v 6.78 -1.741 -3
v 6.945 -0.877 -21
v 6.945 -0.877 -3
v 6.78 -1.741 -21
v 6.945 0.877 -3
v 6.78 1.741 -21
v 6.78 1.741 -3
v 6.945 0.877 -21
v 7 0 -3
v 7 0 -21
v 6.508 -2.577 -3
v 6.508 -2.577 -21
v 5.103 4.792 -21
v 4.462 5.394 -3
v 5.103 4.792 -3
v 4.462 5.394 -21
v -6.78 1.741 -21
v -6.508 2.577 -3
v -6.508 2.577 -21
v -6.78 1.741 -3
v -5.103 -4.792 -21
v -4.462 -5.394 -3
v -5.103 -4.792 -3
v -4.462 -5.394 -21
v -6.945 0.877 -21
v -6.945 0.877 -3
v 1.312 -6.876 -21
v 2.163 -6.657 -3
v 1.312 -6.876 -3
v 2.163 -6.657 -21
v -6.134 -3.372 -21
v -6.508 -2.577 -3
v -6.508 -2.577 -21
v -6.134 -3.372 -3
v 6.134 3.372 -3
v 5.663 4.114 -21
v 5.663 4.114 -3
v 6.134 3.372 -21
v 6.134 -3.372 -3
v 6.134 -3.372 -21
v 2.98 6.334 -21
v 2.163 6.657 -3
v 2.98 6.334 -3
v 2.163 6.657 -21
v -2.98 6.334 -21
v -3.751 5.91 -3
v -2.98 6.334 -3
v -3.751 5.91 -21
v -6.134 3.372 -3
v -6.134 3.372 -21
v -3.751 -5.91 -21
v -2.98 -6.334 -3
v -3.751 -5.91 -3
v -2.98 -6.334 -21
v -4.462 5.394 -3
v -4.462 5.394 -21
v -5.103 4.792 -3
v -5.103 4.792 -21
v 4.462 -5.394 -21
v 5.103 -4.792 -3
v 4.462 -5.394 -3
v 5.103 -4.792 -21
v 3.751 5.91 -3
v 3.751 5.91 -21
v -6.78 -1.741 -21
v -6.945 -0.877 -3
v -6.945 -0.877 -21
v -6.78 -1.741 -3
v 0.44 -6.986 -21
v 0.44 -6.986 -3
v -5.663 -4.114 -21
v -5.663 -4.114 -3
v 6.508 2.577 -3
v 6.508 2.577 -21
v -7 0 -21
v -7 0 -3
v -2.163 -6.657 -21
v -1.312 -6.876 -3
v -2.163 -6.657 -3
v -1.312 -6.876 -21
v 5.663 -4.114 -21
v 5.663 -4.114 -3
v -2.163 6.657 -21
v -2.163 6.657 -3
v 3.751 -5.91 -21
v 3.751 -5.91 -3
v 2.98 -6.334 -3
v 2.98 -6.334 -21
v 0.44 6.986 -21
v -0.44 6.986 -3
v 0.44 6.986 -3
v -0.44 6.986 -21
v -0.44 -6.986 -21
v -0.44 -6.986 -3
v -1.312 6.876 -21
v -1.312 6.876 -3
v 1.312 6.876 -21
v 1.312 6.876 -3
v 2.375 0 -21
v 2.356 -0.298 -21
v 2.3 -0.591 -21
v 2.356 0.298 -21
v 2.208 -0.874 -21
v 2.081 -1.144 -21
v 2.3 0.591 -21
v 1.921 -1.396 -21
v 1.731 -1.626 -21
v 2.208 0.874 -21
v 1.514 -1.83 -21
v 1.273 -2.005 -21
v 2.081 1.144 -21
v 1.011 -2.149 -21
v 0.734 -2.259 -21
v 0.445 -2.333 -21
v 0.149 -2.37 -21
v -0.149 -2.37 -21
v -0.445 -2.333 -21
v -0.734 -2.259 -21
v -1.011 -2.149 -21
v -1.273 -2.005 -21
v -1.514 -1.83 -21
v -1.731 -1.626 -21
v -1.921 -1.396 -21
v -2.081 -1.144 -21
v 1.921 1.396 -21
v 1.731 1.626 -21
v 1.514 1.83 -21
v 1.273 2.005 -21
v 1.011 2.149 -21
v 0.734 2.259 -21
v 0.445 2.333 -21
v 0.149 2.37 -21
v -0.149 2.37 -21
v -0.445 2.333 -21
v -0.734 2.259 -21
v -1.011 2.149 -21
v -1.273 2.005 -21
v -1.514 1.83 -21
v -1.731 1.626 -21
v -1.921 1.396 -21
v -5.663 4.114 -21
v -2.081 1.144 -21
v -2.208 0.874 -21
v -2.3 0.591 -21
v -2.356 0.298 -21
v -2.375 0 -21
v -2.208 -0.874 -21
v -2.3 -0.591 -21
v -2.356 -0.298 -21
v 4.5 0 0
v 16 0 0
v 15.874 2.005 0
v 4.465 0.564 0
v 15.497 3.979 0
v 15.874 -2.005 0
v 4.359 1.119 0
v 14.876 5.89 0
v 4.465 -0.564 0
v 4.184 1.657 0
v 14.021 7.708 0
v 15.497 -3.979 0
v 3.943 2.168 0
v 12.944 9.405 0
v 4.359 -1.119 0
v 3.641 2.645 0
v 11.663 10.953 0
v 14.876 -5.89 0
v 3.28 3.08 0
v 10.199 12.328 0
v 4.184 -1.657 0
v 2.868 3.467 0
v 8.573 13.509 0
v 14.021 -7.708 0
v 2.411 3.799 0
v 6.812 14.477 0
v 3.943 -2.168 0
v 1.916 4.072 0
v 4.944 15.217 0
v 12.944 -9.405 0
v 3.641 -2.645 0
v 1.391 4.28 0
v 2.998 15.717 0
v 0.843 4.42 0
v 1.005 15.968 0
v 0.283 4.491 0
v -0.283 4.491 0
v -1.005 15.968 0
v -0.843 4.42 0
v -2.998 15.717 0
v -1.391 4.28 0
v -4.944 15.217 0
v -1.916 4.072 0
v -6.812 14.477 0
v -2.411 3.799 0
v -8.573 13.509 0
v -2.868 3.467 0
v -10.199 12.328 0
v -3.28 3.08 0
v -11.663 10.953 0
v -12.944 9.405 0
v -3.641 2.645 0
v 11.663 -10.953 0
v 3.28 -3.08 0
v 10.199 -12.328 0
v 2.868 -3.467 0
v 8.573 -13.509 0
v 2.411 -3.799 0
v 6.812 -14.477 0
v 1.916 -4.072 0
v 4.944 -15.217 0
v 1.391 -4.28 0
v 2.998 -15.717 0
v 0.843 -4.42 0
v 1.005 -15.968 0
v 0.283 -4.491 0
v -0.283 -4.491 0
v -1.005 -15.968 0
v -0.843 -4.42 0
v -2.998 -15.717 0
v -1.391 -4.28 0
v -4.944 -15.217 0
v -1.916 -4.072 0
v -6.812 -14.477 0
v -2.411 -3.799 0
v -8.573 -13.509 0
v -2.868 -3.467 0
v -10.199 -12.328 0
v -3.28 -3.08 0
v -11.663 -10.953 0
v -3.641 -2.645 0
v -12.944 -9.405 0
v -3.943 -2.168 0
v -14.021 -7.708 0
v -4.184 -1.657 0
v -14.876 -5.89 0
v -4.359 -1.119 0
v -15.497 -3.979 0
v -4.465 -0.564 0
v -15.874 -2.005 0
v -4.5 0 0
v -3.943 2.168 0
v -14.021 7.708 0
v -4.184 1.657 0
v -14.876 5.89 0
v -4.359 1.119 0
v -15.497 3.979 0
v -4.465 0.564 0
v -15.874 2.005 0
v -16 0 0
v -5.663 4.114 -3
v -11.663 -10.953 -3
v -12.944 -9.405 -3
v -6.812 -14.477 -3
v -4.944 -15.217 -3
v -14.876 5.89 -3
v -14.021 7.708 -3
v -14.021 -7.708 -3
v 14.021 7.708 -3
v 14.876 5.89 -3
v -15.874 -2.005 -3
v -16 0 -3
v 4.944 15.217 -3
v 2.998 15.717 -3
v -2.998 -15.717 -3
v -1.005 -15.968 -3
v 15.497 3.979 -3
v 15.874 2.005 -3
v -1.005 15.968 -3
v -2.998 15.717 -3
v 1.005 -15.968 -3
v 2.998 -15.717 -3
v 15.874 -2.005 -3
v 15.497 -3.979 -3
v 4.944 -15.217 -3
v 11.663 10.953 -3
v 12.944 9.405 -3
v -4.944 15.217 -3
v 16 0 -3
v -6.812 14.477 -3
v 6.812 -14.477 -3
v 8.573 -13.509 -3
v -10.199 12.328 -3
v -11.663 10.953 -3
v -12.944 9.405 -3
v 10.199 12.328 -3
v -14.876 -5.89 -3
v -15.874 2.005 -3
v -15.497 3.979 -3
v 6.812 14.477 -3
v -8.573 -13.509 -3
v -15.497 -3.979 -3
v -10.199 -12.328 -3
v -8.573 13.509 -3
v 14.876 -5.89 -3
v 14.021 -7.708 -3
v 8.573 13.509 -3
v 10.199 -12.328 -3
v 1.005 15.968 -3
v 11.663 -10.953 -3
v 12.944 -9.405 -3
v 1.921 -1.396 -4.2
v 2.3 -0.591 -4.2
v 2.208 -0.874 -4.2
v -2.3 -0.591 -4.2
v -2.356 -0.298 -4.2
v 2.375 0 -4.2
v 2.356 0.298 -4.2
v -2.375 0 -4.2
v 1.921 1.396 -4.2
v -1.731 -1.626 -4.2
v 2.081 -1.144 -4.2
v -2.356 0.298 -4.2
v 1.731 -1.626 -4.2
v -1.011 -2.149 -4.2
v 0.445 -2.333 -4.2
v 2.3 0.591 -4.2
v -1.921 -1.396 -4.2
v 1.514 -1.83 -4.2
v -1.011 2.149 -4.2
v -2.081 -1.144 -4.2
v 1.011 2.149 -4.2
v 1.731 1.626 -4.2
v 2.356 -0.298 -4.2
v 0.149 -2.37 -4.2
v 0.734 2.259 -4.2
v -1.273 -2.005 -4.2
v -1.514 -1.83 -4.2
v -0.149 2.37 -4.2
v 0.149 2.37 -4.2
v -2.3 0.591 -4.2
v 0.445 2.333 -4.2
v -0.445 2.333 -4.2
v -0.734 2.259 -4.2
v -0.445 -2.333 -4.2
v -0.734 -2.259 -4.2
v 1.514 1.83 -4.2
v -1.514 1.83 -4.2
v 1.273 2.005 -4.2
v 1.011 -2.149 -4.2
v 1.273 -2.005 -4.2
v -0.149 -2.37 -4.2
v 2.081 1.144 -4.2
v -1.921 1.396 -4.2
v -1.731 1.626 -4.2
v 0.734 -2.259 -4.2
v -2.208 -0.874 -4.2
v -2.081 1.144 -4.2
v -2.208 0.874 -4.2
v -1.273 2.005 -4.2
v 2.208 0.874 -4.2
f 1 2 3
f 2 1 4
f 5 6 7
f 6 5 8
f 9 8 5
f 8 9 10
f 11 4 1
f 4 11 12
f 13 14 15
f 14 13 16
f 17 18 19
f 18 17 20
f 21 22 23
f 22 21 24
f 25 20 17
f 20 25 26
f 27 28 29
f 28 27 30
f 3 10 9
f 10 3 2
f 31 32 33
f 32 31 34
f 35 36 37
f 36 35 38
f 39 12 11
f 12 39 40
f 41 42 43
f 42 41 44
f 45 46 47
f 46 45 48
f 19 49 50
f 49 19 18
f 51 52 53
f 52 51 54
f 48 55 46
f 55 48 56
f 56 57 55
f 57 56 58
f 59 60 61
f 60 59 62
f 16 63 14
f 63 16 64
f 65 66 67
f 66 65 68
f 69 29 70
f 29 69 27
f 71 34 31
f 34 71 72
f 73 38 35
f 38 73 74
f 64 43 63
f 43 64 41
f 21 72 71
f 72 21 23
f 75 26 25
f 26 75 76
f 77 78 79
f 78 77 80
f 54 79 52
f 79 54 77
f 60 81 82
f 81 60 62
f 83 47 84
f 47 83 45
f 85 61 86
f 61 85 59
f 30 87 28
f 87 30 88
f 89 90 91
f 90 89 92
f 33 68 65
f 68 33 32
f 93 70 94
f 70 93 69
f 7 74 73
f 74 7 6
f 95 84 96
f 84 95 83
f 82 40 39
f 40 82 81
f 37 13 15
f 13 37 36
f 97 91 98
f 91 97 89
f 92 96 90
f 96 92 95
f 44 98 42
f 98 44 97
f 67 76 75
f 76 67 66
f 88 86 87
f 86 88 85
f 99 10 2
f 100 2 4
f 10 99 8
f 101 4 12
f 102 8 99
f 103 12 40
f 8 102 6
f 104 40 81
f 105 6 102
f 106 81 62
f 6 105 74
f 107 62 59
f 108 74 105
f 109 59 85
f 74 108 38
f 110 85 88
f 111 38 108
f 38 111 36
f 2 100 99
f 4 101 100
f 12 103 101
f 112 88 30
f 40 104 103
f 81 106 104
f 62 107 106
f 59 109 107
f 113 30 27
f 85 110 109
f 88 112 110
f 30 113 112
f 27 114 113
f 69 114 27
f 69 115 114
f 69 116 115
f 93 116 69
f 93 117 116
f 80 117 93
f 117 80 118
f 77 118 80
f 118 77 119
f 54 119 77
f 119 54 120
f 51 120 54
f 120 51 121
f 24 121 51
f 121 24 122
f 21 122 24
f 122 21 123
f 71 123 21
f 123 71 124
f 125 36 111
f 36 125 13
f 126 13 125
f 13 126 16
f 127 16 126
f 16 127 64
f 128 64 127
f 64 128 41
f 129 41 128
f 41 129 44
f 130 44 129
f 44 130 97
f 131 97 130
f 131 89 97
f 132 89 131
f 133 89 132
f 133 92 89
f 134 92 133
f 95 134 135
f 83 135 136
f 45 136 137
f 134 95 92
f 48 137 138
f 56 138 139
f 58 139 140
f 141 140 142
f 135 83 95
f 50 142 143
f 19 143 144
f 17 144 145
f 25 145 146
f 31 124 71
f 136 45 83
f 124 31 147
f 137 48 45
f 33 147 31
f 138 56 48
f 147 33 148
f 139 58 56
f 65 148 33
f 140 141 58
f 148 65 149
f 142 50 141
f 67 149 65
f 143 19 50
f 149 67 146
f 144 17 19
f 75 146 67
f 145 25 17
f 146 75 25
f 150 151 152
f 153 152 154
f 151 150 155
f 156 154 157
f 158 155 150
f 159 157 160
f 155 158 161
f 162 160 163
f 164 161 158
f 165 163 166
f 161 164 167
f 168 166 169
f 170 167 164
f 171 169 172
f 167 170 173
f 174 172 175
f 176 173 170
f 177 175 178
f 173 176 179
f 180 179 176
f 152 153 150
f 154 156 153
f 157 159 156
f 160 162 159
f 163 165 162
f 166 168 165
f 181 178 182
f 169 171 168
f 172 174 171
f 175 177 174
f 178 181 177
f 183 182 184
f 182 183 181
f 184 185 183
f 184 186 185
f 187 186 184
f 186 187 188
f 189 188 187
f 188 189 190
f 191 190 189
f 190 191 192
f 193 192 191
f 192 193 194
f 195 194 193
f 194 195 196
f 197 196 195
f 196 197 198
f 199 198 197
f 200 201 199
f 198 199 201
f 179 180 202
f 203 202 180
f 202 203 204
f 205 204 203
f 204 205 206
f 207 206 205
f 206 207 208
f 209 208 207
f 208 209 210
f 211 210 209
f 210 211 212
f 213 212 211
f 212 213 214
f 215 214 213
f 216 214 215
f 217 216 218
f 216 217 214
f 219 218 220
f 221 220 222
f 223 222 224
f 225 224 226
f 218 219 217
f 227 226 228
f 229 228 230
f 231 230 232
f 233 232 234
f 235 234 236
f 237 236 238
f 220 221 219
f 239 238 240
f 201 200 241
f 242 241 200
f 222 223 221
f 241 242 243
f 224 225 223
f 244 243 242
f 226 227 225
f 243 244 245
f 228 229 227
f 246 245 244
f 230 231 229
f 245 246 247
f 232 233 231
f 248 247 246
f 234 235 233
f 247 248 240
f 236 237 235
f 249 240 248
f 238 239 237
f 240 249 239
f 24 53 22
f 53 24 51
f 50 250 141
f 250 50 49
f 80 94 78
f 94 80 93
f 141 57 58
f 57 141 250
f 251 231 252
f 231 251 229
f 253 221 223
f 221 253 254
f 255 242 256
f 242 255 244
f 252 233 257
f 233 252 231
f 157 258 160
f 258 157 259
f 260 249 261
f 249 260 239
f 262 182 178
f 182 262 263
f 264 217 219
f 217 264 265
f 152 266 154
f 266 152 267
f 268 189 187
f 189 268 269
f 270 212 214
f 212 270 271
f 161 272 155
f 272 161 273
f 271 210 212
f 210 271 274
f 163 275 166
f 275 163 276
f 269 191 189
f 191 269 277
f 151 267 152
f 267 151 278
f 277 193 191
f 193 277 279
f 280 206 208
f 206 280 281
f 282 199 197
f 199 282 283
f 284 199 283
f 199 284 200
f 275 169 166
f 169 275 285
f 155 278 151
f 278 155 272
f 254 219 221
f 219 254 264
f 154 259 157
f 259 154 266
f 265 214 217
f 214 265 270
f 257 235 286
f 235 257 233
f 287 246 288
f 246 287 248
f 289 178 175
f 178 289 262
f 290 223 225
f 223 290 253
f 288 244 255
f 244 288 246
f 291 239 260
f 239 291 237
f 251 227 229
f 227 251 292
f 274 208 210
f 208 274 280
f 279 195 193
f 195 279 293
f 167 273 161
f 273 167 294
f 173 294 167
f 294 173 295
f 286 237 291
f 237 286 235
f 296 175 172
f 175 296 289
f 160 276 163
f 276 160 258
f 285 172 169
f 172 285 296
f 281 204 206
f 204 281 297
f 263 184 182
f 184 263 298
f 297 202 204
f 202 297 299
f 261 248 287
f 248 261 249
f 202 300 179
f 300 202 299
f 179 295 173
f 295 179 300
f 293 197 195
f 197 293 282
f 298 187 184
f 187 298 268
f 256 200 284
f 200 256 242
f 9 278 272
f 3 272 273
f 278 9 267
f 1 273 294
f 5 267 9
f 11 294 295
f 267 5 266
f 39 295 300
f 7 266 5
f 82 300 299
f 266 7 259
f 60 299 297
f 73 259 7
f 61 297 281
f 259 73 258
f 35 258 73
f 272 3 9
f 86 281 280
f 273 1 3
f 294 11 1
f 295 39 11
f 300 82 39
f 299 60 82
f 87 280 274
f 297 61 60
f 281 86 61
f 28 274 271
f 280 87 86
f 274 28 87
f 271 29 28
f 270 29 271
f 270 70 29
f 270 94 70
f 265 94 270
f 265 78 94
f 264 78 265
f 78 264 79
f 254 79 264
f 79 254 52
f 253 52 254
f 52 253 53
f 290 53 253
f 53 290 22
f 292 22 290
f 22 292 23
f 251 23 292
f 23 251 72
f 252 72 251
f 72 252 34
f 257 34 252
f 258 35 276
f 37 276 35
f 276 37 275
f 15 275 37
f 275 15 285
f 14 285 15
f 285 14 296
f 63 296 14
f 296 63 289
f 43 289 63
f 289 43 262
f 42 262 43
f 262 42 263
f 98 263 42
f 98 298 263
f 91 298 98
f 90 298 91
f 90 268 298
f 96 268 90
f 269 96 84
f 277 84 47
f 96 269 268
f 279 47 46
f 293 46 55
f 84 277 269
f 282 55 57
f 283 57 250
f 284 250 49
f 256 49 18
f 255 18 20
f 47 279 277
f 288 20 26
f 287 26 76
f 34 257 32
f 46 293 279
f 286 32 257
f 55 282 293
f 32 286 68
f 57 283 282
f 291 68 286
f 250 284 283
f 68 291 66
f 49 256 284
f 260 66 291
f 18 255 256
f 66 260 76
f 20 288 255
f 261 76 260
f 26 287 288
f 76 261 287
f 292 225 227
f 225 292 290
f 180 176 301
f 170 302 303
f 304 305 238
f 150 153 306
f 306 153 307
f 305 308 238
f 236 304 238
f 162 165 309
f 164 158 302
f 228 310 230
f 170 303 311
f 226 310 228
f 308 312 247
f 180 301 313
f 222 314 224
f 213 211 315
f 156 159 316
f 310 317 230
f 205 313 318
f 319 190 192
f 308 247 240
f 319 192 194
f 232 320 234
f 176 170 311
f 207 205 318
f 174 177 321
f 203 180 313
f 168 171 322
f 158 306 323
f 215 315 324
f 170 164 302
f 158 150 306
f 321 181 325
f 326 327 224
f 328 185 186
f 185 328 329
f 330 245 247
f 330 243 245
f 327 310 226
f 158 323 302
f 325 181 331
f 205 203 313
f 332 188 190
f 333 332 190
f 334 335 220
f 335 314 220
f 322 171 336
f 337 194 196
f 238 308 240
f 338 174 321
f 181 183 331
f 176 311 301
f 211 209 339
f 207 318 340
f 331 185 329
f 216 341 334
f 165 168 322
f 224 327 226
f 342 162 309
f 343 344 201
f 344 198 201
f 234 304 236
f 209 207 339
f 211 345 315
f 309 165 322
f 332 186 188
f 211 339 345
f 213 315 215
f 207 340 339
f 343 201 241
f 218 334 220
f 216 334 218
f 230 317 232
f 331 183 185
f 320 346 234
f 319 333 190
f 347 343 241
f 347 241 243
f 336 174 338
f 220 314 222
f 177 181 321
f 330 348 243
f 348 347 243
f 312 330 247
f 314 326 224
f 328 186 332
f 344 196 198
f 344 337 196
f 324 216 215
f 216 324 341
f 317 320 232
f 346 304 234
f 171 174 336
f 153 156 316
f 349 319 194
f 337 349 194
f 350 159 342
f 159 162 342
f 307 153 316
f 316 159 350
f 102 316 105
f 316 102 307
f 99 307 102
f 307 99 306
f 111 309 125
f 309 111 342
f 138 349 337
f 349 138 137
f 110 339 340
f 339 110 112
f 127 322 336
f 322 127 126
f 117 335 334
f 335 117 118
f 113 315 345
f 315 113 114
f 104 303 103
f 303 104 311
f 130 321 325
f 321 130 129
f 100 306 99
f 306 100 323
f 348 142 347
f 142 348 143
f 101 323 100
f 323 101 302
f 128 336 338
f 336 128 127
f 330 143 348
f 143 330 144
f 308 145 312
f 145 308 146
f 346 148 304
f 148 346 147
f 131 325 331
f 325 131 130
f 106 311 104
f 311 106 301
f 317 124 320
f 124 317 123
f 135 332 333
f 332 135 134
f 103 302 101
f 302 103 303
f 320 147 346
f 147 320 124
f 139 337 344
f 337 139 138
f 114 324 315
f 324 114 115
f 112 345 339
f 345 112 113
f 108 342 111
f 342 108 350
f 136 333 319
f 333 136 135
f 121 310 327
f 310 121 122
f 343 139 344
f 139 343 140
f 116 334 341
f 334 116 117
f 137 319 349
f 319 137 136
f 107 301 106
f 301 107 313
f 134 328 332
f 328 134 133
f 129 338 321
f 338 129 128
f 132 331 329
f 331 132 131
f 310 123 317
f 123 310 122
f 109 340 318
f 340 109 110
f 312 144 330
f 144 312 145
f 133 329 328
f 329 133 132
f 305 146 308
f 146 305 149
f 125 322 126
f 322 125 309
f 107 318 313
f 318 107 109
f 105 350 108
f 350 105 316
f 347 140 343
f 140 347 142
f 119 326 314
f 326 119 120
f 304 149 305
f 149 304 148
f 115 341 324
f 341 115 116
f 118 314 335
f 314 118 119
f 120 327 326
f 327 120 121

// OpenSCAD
$fn = 50;


difference() {
	union() {
		translate(v = [0, 0, -21.0000000000]) {
			cylinder(h = 21, r = 7.0000000000);
		}
		translate(v = [0, 0, -3.0000000000]) {
			cylinder(h = 3, r = 16.0000000000);
		}
	}
	union() {
		translate(v = [0, 0, 0]) {
			rotate(a = [0, 0, 0]) {
				difference() {
					union() {
						#translate(v = [0, 0, -21.0000000000]) {
							cylinder(h = 21, r = 2.2500000000);
						}
						#translate(v = [0, 0, -4.2000000000]) {
							cylinder(h = 4.2000000000, r1 = 2.3750000000, r2 = 4.5000000000);
						}
						#translate(v = [0, 0, -21.0000000000]) {
							cylinder(h = 21, r = 2.3750000000);
						}
						#translate(v = [0, 0, -21.0000000000]) {
							cylinder(h = 21, r = 2.2500000000);
						}
					}
					union();
				}
			}
		}
	}
}
